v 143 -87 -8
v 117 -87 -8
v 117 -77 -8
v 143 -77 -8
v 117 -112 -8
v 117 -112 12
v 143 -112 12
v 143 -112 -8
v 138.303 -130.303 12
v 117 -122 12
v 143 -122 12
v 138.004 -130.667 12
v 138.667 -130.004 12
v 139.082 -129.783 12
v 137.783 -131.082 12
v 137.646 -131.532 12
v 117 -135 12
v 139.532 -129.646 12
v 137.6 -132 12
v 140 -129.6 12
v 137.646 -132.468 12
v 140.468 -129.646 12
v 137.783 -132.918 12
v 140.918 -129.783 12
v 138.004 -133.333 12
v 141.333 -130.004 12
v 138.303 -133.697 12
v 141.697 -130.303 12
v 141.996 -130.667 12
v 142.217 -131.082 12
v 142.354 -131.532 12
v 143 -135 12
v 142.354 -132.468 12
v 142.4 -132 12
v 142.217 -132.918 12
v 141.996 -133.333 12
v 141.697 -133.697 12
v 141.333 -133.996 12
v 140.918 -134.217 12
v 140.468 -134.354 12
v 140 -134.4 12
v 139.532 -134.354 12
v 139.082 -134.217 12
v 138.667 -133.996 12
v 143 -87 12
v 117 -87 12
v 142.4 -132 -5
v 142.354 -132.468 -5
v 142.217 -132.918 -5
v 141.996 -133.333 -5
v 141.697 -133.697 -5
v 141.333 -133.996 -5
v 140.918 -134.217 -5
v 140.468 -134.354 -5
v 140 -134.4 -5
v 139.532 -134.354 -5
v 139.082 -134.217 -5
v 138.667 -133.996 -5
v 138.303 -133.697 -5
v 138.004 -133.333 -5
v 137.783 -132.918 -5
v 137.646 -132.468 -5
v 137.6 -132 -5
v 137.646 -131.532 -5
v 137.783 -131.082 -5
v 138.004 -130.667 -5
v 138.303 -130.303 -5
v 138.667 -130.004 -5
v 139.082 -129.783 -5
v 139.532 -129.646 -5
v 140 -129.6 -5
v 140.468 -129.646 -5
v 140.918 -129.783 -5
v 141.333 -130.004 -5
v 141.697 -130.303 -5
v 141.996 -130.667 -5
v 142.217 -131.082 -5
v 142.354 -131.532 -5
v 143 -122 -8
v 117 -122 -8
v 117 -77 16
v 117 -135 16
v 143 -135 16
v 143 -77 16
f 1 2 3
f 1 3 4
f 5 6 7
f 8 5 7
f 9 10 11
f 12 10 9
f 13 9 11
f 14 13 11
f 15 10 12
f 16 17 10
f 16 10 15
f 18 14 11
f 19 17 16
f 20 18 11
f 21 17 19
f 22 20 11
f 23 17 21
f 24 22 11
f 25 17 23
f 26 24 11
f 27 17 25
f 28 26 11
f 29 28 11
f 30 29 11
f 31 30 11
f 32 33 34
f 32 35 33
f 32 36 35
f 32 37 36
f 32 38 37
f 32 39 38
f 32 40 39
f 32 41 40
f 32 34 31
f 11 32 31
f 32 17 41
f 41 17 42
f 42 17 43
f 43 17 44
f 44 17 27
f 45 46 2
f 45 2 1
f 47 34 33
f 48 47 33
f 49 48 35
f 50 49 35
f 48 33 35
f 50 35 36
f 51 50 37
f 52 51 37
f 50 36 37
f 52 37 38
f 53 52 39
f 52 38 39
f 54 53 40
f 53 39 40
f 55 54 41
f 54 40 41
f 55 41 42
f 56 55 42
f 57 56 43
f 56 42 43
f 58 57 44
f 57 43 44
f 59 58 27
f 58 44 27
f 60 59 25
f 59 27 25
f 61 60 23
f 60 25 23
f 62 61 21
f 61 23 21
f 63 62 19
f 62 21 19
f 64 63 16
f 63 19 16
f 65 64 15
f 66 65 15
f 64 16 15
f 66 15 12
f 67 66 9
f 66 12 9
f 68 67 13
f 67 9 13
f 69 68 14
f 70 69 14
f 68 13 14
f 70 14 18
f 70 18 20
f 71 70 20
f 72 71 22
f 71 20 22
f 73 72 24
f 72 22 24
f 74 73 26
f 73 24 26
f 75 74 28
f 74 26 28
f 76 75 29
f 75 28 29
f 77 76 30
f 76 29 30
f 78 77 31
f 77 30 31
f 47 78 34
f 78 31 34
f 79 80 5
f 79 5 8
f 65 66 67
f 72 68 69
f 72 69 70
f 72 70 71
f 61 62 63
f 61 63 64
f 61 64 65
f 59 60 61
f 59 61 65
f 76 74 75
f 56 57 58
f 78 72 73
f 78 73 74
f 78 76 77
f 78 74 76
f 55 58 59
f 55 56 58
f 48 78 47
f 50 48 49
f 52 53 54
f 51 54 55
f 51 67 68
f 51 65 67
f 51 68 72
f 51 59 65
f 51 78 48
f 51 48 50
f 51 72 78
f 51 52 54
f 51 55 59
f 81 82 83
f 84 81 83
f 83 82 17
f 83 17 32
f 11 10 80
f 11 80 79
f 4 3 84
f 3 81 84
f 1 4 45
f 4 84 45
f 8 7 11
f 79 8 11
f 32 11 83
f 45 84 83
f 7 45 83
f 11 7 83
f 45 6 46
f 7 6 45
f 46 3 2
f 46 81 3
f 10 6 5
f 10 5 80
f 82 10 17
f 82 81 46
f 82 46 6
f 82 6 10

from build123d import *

# Parameters (mm, degrees)
SKETCH082_W  = 26
SKETCH082_H  = 58
PAD036_DEPTH = 4
SKETCH083_W  = 26
SKETCH083_H  = 10
PAD037_DEPTH = 20
SKETCH084_R  = 2.4
PAD038_DEPTH = 17


with BuildPart() as part:
    # Sketch082 → Pad036 (new body)
    with BuildSketch(Plane(origin=(125, -105, 16), x_dir=(1, 0, 0), z_dir=(0, 0, -1))):
        with Locations((5, 1)):
            Rectangle(SKETCH082_W, SKETCH082_H)
    extrude(amount=PAD036_DEPTH)

    # Sketch083 → Pad037 (new body)
    with BuildSketch(Plane(origin=(125, -105, 12), x_dir=(1, 0, 0), z_dir=(0, 0, -1))):
        with Locations((5, 12)):
            Rectangle(SKETCH083_W, SKETCH083_H)
        with Locations((5, -23)):
            Rectangle(SKETCH083_W, SKETCH083_H)
    extrude(amount=PAD037_DEPTH)

    # Sketch084 → Pad038 (new body)
    with BuildSketch(Plane(origin=(125, -105, 12), x_dir=(1, 0, 0), z_dir=(0, 0, -1))):
        with Locations((15, 27)):
            Circle(SKETCH084_R)
    extrude(amount=PAD038_DEPTH)


solid = part.part
